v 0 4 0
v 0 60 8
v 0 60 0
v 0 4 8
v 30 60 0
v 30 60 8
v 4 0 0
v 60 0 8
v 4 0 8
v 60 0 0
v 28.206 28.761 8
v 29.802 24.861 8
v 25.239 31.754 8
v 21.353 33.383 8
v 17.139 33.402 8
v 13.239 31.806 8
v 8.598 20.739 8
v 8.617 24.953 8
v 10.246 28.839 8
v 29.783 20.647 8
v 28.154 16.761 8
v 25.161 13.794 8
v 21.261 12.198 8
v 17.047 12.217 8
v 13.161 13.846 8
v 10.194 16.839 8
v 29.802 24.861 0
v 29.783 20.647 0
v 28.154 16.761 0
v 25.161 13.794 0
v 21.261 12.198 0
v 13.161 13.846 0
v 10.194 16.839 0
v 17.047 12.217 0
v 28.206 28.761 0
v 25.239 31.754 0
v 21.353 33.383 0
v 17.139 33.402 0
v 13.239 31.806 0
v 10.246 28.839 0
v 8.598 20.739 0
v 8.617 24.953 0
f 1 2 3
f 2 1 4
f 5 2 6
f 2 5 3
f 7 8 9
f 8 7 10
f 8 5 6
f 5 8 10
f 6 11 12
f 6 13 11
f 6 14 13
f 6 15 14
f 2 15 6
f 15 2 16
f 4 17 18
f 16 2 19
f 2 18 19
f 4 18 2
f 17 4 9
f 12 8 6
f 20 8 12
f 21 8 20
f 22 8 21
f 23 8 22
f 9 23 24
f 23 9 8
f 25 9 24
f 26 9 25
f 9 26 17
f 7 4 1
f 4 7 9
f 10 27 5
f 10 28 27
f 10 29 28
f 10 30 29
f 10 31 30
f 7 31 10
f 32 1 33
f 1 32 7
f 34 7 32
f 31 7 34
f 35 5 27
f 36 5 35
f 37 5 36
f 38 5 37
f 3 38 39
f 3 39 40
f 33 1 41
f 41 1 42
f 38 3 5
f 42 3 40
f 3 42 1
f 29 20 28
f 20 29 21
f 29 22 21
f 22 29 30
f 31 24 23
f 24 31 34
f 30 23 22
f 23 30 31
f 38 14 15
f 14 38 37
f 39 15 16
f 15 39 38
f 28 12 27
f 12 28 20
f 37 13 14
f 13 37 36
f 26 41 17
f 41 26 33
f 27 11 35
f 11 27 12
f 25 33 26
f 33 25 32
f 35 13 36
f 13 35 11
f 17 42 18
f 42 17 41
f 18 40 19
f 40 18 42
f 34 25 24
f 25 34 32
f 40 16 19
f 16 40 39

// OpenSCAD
$fn = 32;

// ----------------------------------------------------------------------
// Bracket plate: gusset 60 x 60
// ----------------------------------------------------------------------

// --- parameters (mm) ---
hole_r = 4;               // bolt hole radius
plate_t = 8;              // plate thickness, Z (extrusion height)
gus_a = 60;               // base length
gus_b = 60;               // height
top_x = 30;               // top edge X of the angled cut
light_r = 10.8;           // lightening hole radius

light_d = 2 * light_r;

profile = [[4, 0], [30, 0], [60, 0], [30, 60], [0, 60], [0, 4]];  // primary outline, 6 points, counter clockwise
void_1 = [[29.802, 24.861], [28.206, 28.761], [25.239, 31.754], [21.353, 33.383], [17.139, 33.402], [13.239, 31.806], [10.246, 28.839], [8.617, 24.953], [8.598, 20.739], [10.194, 16.839], [13.161, 13.846], [17.047, 12.217], [21.261, 12.198], [25.161, 13.794], [28.154, 16.761], [29.783, 20.647]];  // lightening hole, 16 points

// --- the one profile operation ---
difference() {
  linear_extrude(height = plate_t) polygon(points = profile);
  translate([0, 0, -1])
    linear_extrude(height = plate_t + 2) polygon(points = void_1);
}
